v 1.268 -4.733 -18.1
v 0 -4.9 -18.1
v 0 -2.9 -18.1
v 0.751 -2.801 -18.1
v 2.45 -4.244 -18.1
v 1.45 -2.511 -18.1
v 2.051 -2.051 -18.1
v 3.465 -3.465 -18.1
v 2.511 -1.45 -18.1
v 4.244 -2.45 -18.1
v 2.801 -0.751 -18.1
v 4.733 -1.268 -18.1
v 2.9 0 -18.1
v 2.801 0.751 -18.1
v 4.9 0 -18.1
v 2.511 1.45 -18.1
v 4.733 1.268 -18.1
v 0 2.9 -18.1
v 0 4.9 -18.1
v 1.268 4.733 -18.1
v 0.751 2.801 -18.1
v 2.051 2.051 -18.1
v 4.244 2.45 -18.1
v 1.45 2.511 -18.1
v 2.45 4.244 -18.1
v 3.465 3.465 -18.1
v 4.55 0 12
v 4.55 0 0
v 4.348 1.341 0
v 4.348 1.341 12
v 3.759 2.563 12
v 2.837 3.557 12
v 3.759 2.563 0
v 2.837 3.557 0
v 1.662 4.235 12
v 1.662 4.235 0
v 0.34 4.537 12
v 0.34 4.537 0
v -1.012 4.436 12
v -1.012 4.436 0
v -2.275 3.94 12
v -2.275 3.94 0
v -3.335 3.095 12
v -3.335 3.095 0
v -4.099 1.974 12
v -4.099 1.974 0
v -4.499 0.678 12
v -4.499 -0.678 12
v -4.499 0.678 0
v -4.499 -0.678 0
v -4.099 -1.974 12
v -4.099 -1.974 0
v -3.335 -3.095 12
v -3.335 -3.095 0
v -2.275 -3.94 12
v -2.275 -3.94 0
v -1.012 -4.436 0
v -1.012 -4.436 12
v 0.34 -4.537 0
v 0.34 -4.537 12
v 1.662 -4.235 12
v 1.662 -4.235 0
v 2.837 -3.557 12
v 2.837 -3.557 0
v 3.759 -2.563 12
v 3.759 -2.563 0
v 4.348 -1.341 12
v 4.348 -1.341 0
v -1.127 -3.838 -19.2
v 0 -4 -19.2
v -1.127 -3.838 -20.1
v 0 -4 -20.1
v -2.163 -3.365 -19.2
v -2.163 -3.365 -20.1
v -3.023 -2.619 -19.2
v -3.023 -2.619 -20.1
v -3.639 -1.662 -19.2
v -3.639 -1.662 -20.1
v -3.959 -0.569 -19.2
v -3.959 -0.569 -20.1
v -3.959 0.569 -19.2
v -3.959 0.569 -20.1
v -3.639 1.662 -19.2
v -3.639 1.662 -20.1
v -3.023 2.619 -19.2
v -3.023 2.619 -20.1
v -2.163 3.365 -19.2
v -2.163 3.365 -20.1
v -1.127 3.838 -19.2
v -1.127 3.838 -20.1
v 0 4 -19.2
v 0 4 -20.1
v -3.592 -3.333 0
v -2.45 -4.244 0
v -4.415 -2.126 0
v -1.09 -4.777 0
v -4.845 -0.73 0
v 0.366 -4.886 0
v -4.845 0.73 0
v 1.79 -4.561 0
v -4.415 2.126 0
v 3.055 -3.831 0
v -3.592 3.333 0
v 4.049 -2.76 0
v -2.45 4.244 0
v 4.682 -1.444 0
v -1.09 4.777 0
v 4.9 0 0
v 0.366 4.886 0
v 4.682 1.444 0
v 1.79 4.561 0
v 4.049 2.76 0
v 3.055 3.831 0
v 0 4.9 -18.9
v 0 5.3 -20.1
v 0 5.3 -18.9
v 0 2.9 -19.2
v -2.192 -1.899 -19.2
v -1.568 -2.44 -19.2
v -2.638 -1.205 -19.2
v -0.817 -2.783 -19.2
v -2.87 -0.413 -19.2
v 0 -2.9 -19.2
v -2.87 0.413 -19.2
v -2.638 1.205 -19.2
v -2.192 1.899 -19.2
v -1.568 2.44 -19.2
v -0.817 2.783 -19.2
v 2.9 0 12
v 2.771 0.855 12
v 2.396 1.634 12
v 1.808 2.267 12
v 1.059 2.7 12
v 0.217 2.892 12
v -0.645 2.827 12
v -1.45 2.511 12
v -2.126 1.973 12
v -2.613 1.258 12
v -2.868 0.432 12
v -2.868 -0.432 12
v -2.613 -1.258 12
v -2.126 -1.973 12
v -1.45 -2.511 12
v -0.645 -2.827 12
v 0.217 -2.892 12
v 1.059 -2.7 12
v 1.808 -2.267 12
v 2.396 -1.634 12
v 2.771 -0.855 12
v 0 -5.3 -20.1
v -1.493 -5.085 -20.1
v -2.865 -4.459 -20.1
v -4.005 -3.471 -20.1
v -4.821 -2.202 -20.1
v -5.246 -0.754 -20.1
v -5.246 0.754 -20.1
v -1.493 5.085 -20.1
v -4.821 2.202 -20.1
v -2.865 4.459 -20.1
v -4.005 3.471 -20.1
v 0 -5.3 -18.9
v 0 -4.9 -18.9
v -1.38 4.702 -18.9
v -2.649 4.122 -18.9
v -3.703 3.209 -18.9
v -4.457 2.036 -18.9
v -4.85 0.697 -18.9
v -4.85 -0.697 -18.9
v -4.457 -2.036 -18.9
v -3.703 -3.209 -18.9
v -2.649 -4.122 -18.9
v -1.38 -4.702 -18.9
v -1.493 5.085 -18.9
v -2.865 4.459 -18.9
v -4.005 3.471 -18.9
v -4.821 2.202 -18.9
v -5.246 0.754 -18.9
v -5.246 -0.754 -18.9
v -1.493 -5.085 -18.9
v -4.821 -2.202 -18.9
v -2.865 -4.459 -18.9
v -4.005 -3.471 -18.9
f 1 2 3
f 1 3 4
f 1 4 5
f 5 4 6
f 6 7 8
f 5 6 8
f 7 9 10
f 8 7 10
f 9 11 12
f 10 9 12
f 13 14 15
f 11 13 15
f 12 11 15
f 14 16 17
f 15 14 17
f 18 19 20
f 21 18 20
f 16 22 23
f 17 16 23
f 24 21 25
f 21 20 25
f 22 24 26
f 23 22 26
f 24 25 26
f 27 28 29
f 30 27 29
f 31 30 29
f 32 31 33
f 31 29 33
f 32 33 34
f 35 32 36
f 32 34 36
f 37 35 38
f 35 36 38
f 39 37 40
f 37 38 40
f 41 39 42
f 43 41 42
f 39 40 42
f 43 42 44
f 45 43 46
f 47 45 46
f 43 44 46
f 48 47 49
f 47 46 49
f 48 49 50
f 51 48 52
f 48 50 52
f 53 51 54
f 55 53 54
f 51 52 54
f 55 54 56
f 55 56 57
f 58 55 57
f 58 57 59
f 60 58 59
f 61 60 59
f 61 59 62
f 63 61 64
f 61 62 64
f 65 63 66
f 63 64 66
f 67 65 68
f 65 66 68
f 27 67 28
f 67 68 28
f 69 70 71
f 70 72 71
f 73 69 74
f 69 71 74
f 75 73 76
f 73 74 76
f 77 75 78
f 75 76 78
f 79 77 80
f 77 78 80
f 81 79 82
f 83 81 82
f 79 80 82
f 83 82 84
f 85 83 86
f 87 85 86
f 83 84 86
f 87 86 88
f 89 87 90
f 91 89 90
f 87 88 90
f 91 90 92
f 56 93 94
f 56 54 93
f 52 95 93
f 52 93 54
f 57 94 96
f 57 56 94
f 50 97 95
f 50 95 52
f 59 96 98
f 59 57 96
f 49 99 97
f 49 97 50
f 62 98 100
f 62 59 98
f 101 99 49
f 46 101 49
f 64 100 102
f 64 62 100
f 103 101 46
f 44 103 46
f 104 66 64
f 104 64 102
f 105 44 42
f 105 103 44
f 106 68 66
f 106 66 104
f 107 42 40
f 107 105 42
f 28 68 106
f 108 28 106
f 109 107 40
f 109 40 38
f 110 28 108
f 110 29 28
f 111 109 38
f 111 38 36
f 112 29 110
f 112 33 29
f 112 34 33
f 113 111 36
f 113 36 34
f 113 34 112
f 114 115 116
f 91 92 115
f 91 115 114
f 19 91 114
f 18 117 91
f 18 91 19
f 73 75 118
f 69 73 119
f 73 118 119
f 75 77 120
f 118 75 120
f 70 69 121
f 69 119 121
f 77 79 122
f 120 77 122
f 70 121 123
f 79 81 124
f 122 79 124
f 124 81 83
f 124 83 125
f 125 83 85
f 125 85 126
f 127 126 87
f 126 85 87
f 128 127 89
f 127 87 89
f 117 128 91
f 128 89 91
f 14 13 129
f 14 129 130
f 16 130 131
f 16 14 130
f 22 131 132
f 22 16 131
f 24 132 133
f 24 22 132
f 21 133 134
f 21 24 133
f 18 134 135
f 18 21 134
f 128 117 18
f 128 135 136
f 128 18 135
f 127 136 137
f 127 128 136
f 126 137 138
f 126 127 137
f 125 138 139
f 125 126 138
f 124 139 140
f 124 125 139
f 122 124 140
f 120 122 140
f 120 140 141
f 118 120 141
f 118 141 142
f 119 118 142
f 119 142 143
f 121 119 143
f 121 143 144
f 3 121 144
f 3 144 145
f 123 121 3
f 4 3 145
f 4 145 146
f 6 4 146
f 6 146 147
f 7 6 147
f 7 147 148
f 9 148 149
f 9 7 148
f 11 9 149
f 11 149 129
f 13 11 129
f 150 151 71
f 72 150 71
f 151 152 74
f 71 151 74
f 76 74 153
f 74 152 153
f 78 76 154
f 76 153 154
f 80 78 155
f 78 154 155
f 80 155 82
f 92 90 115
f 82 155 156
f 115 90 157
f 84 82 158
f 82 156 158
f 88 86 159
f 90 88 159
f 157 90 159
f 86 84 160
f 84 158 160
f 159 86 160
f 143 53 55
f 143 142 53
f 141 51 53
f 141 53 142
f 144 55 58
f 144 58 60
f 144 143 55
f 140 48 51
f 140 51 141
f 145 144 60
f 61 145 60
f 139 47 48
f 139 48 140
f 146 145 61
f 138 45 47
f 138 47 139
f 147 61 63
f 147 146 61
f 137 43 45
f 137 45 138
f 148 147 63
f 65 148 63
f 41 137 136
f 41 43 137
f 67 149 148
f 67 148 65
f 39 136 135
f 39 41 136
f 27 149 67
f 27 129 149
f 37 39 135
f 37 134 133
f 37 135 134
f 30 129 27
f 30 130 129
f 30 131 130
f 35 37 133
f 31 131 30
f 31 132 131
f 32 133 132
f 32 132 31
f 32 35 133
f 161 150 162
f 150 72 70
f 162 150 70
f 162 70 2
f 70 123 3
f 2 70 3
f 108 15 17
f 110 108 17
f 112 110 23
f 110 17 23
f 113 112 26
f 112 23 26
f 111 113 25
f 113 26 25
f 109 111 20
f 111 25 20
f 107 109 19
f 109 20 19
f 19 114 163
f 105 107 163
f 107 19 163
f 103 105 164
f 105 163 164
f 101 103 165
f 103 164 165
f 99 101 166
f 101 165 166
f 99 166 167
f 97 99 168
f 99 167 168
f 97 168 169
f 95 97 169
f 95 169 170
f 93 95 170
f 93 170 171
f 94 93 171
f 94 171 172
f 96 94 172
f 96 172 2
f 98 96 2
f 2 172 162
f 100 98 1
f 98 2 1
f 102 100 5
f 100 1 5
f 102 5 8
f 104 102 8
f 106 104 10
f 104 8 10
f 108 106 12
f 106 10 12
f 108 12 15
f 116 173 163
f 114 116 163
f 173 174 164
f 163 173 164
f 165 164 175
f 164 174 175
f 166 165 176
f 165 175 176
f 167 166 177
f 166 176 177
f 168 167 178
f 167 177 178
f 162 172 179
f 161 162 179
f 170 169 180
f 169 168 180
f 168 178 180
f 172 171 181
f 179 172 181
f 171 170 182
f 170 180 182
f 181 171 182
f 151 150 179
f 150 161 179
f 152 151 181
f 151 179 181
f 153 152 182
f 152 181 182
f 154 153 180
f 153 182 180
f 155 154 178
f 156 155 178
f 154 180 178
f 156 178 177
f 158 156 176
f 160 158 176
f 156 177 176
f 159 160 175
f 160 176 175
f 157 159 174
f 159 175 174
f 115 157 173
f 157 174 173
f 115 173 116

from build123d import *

# Parameters (mm, degrees)
ESQUISSE1_R             = 4.55
ESQUISSE1_R_2           = 2.9
BOSS_EXTRU_1_DEPTH      = 12
BOSS_EXTRU_2_START      = -19.2
ESQUISSE1_3_R           = 4.9
ESQUISSE1_3_R_2         = 2.9
BOSS_EXTRU_2_DEPTH      = 19.2
ESQUISSE2_W             = 6.768135737
ESQUISSE2_H             = 1.1
ENL_V_MAT_EXTRU_1_DEPTH = 5
R_VOLUTION1_ANGLE       = 180


with BuildPart() as part:
    # Esquisse1 → Boss.-Extru.1 (new body)
    with BuildSketch(Plane.XY):
        Circle(ESQUISSE1_R)
        Circle(ESQUISSE1_R_2, mode=Mode.SUBTRACT)
    extrude(amount=BOSS_EXTRU_1_DEPTH)

    # Esquisse1<3> → Boss.-Extru.2 (add)
    with BuildSketch(Plane.XY.offset(BOSS_EXTRU_2_START)):
        Circle(ESQUISSE1_3_R)
        Circle(ESQUISSE1_3_R_2, mode=Mode.SUBTRACT)
    extrude(amount=BOSS_EXTRU_2_DEPTH)

    # Esquisse2 → Enlèv. mat.-Extru.1 (cut, symmetric)
    with BuildSketch(Plane(origin=(0, 0, 0), x_dir=(1, 0, 0), z_dir=(0, 1, 0))):
        with Locations((3.384067869, 18.65)):
            Rectangle(ESQUISSE2_W, ESQUISSE2_H)
    extrude(amount=ENL_V_MAT_EXTRU_1_DEPTH, both=True, mode=Mode.SUBTRACT)

    # Esquisse3 → Révolution1 (revolve)
    with BuildSketch(Plane(origin=(0, 0, 0), x_dir=(0, 0, -1), z_dir=(1, 0, 0))):
        Polygon((18.9, -4.9), (19.2, -4.9), (19.2, -4), (20.1, -4), (20.1, -5.3), (18.9, -5.3), align=None)
    revolve(axis=Axis((0, 0, 0), (0, 0, -1)), revolution_arc=R_VOLUTION1_ANGLE)


solid = part.part
